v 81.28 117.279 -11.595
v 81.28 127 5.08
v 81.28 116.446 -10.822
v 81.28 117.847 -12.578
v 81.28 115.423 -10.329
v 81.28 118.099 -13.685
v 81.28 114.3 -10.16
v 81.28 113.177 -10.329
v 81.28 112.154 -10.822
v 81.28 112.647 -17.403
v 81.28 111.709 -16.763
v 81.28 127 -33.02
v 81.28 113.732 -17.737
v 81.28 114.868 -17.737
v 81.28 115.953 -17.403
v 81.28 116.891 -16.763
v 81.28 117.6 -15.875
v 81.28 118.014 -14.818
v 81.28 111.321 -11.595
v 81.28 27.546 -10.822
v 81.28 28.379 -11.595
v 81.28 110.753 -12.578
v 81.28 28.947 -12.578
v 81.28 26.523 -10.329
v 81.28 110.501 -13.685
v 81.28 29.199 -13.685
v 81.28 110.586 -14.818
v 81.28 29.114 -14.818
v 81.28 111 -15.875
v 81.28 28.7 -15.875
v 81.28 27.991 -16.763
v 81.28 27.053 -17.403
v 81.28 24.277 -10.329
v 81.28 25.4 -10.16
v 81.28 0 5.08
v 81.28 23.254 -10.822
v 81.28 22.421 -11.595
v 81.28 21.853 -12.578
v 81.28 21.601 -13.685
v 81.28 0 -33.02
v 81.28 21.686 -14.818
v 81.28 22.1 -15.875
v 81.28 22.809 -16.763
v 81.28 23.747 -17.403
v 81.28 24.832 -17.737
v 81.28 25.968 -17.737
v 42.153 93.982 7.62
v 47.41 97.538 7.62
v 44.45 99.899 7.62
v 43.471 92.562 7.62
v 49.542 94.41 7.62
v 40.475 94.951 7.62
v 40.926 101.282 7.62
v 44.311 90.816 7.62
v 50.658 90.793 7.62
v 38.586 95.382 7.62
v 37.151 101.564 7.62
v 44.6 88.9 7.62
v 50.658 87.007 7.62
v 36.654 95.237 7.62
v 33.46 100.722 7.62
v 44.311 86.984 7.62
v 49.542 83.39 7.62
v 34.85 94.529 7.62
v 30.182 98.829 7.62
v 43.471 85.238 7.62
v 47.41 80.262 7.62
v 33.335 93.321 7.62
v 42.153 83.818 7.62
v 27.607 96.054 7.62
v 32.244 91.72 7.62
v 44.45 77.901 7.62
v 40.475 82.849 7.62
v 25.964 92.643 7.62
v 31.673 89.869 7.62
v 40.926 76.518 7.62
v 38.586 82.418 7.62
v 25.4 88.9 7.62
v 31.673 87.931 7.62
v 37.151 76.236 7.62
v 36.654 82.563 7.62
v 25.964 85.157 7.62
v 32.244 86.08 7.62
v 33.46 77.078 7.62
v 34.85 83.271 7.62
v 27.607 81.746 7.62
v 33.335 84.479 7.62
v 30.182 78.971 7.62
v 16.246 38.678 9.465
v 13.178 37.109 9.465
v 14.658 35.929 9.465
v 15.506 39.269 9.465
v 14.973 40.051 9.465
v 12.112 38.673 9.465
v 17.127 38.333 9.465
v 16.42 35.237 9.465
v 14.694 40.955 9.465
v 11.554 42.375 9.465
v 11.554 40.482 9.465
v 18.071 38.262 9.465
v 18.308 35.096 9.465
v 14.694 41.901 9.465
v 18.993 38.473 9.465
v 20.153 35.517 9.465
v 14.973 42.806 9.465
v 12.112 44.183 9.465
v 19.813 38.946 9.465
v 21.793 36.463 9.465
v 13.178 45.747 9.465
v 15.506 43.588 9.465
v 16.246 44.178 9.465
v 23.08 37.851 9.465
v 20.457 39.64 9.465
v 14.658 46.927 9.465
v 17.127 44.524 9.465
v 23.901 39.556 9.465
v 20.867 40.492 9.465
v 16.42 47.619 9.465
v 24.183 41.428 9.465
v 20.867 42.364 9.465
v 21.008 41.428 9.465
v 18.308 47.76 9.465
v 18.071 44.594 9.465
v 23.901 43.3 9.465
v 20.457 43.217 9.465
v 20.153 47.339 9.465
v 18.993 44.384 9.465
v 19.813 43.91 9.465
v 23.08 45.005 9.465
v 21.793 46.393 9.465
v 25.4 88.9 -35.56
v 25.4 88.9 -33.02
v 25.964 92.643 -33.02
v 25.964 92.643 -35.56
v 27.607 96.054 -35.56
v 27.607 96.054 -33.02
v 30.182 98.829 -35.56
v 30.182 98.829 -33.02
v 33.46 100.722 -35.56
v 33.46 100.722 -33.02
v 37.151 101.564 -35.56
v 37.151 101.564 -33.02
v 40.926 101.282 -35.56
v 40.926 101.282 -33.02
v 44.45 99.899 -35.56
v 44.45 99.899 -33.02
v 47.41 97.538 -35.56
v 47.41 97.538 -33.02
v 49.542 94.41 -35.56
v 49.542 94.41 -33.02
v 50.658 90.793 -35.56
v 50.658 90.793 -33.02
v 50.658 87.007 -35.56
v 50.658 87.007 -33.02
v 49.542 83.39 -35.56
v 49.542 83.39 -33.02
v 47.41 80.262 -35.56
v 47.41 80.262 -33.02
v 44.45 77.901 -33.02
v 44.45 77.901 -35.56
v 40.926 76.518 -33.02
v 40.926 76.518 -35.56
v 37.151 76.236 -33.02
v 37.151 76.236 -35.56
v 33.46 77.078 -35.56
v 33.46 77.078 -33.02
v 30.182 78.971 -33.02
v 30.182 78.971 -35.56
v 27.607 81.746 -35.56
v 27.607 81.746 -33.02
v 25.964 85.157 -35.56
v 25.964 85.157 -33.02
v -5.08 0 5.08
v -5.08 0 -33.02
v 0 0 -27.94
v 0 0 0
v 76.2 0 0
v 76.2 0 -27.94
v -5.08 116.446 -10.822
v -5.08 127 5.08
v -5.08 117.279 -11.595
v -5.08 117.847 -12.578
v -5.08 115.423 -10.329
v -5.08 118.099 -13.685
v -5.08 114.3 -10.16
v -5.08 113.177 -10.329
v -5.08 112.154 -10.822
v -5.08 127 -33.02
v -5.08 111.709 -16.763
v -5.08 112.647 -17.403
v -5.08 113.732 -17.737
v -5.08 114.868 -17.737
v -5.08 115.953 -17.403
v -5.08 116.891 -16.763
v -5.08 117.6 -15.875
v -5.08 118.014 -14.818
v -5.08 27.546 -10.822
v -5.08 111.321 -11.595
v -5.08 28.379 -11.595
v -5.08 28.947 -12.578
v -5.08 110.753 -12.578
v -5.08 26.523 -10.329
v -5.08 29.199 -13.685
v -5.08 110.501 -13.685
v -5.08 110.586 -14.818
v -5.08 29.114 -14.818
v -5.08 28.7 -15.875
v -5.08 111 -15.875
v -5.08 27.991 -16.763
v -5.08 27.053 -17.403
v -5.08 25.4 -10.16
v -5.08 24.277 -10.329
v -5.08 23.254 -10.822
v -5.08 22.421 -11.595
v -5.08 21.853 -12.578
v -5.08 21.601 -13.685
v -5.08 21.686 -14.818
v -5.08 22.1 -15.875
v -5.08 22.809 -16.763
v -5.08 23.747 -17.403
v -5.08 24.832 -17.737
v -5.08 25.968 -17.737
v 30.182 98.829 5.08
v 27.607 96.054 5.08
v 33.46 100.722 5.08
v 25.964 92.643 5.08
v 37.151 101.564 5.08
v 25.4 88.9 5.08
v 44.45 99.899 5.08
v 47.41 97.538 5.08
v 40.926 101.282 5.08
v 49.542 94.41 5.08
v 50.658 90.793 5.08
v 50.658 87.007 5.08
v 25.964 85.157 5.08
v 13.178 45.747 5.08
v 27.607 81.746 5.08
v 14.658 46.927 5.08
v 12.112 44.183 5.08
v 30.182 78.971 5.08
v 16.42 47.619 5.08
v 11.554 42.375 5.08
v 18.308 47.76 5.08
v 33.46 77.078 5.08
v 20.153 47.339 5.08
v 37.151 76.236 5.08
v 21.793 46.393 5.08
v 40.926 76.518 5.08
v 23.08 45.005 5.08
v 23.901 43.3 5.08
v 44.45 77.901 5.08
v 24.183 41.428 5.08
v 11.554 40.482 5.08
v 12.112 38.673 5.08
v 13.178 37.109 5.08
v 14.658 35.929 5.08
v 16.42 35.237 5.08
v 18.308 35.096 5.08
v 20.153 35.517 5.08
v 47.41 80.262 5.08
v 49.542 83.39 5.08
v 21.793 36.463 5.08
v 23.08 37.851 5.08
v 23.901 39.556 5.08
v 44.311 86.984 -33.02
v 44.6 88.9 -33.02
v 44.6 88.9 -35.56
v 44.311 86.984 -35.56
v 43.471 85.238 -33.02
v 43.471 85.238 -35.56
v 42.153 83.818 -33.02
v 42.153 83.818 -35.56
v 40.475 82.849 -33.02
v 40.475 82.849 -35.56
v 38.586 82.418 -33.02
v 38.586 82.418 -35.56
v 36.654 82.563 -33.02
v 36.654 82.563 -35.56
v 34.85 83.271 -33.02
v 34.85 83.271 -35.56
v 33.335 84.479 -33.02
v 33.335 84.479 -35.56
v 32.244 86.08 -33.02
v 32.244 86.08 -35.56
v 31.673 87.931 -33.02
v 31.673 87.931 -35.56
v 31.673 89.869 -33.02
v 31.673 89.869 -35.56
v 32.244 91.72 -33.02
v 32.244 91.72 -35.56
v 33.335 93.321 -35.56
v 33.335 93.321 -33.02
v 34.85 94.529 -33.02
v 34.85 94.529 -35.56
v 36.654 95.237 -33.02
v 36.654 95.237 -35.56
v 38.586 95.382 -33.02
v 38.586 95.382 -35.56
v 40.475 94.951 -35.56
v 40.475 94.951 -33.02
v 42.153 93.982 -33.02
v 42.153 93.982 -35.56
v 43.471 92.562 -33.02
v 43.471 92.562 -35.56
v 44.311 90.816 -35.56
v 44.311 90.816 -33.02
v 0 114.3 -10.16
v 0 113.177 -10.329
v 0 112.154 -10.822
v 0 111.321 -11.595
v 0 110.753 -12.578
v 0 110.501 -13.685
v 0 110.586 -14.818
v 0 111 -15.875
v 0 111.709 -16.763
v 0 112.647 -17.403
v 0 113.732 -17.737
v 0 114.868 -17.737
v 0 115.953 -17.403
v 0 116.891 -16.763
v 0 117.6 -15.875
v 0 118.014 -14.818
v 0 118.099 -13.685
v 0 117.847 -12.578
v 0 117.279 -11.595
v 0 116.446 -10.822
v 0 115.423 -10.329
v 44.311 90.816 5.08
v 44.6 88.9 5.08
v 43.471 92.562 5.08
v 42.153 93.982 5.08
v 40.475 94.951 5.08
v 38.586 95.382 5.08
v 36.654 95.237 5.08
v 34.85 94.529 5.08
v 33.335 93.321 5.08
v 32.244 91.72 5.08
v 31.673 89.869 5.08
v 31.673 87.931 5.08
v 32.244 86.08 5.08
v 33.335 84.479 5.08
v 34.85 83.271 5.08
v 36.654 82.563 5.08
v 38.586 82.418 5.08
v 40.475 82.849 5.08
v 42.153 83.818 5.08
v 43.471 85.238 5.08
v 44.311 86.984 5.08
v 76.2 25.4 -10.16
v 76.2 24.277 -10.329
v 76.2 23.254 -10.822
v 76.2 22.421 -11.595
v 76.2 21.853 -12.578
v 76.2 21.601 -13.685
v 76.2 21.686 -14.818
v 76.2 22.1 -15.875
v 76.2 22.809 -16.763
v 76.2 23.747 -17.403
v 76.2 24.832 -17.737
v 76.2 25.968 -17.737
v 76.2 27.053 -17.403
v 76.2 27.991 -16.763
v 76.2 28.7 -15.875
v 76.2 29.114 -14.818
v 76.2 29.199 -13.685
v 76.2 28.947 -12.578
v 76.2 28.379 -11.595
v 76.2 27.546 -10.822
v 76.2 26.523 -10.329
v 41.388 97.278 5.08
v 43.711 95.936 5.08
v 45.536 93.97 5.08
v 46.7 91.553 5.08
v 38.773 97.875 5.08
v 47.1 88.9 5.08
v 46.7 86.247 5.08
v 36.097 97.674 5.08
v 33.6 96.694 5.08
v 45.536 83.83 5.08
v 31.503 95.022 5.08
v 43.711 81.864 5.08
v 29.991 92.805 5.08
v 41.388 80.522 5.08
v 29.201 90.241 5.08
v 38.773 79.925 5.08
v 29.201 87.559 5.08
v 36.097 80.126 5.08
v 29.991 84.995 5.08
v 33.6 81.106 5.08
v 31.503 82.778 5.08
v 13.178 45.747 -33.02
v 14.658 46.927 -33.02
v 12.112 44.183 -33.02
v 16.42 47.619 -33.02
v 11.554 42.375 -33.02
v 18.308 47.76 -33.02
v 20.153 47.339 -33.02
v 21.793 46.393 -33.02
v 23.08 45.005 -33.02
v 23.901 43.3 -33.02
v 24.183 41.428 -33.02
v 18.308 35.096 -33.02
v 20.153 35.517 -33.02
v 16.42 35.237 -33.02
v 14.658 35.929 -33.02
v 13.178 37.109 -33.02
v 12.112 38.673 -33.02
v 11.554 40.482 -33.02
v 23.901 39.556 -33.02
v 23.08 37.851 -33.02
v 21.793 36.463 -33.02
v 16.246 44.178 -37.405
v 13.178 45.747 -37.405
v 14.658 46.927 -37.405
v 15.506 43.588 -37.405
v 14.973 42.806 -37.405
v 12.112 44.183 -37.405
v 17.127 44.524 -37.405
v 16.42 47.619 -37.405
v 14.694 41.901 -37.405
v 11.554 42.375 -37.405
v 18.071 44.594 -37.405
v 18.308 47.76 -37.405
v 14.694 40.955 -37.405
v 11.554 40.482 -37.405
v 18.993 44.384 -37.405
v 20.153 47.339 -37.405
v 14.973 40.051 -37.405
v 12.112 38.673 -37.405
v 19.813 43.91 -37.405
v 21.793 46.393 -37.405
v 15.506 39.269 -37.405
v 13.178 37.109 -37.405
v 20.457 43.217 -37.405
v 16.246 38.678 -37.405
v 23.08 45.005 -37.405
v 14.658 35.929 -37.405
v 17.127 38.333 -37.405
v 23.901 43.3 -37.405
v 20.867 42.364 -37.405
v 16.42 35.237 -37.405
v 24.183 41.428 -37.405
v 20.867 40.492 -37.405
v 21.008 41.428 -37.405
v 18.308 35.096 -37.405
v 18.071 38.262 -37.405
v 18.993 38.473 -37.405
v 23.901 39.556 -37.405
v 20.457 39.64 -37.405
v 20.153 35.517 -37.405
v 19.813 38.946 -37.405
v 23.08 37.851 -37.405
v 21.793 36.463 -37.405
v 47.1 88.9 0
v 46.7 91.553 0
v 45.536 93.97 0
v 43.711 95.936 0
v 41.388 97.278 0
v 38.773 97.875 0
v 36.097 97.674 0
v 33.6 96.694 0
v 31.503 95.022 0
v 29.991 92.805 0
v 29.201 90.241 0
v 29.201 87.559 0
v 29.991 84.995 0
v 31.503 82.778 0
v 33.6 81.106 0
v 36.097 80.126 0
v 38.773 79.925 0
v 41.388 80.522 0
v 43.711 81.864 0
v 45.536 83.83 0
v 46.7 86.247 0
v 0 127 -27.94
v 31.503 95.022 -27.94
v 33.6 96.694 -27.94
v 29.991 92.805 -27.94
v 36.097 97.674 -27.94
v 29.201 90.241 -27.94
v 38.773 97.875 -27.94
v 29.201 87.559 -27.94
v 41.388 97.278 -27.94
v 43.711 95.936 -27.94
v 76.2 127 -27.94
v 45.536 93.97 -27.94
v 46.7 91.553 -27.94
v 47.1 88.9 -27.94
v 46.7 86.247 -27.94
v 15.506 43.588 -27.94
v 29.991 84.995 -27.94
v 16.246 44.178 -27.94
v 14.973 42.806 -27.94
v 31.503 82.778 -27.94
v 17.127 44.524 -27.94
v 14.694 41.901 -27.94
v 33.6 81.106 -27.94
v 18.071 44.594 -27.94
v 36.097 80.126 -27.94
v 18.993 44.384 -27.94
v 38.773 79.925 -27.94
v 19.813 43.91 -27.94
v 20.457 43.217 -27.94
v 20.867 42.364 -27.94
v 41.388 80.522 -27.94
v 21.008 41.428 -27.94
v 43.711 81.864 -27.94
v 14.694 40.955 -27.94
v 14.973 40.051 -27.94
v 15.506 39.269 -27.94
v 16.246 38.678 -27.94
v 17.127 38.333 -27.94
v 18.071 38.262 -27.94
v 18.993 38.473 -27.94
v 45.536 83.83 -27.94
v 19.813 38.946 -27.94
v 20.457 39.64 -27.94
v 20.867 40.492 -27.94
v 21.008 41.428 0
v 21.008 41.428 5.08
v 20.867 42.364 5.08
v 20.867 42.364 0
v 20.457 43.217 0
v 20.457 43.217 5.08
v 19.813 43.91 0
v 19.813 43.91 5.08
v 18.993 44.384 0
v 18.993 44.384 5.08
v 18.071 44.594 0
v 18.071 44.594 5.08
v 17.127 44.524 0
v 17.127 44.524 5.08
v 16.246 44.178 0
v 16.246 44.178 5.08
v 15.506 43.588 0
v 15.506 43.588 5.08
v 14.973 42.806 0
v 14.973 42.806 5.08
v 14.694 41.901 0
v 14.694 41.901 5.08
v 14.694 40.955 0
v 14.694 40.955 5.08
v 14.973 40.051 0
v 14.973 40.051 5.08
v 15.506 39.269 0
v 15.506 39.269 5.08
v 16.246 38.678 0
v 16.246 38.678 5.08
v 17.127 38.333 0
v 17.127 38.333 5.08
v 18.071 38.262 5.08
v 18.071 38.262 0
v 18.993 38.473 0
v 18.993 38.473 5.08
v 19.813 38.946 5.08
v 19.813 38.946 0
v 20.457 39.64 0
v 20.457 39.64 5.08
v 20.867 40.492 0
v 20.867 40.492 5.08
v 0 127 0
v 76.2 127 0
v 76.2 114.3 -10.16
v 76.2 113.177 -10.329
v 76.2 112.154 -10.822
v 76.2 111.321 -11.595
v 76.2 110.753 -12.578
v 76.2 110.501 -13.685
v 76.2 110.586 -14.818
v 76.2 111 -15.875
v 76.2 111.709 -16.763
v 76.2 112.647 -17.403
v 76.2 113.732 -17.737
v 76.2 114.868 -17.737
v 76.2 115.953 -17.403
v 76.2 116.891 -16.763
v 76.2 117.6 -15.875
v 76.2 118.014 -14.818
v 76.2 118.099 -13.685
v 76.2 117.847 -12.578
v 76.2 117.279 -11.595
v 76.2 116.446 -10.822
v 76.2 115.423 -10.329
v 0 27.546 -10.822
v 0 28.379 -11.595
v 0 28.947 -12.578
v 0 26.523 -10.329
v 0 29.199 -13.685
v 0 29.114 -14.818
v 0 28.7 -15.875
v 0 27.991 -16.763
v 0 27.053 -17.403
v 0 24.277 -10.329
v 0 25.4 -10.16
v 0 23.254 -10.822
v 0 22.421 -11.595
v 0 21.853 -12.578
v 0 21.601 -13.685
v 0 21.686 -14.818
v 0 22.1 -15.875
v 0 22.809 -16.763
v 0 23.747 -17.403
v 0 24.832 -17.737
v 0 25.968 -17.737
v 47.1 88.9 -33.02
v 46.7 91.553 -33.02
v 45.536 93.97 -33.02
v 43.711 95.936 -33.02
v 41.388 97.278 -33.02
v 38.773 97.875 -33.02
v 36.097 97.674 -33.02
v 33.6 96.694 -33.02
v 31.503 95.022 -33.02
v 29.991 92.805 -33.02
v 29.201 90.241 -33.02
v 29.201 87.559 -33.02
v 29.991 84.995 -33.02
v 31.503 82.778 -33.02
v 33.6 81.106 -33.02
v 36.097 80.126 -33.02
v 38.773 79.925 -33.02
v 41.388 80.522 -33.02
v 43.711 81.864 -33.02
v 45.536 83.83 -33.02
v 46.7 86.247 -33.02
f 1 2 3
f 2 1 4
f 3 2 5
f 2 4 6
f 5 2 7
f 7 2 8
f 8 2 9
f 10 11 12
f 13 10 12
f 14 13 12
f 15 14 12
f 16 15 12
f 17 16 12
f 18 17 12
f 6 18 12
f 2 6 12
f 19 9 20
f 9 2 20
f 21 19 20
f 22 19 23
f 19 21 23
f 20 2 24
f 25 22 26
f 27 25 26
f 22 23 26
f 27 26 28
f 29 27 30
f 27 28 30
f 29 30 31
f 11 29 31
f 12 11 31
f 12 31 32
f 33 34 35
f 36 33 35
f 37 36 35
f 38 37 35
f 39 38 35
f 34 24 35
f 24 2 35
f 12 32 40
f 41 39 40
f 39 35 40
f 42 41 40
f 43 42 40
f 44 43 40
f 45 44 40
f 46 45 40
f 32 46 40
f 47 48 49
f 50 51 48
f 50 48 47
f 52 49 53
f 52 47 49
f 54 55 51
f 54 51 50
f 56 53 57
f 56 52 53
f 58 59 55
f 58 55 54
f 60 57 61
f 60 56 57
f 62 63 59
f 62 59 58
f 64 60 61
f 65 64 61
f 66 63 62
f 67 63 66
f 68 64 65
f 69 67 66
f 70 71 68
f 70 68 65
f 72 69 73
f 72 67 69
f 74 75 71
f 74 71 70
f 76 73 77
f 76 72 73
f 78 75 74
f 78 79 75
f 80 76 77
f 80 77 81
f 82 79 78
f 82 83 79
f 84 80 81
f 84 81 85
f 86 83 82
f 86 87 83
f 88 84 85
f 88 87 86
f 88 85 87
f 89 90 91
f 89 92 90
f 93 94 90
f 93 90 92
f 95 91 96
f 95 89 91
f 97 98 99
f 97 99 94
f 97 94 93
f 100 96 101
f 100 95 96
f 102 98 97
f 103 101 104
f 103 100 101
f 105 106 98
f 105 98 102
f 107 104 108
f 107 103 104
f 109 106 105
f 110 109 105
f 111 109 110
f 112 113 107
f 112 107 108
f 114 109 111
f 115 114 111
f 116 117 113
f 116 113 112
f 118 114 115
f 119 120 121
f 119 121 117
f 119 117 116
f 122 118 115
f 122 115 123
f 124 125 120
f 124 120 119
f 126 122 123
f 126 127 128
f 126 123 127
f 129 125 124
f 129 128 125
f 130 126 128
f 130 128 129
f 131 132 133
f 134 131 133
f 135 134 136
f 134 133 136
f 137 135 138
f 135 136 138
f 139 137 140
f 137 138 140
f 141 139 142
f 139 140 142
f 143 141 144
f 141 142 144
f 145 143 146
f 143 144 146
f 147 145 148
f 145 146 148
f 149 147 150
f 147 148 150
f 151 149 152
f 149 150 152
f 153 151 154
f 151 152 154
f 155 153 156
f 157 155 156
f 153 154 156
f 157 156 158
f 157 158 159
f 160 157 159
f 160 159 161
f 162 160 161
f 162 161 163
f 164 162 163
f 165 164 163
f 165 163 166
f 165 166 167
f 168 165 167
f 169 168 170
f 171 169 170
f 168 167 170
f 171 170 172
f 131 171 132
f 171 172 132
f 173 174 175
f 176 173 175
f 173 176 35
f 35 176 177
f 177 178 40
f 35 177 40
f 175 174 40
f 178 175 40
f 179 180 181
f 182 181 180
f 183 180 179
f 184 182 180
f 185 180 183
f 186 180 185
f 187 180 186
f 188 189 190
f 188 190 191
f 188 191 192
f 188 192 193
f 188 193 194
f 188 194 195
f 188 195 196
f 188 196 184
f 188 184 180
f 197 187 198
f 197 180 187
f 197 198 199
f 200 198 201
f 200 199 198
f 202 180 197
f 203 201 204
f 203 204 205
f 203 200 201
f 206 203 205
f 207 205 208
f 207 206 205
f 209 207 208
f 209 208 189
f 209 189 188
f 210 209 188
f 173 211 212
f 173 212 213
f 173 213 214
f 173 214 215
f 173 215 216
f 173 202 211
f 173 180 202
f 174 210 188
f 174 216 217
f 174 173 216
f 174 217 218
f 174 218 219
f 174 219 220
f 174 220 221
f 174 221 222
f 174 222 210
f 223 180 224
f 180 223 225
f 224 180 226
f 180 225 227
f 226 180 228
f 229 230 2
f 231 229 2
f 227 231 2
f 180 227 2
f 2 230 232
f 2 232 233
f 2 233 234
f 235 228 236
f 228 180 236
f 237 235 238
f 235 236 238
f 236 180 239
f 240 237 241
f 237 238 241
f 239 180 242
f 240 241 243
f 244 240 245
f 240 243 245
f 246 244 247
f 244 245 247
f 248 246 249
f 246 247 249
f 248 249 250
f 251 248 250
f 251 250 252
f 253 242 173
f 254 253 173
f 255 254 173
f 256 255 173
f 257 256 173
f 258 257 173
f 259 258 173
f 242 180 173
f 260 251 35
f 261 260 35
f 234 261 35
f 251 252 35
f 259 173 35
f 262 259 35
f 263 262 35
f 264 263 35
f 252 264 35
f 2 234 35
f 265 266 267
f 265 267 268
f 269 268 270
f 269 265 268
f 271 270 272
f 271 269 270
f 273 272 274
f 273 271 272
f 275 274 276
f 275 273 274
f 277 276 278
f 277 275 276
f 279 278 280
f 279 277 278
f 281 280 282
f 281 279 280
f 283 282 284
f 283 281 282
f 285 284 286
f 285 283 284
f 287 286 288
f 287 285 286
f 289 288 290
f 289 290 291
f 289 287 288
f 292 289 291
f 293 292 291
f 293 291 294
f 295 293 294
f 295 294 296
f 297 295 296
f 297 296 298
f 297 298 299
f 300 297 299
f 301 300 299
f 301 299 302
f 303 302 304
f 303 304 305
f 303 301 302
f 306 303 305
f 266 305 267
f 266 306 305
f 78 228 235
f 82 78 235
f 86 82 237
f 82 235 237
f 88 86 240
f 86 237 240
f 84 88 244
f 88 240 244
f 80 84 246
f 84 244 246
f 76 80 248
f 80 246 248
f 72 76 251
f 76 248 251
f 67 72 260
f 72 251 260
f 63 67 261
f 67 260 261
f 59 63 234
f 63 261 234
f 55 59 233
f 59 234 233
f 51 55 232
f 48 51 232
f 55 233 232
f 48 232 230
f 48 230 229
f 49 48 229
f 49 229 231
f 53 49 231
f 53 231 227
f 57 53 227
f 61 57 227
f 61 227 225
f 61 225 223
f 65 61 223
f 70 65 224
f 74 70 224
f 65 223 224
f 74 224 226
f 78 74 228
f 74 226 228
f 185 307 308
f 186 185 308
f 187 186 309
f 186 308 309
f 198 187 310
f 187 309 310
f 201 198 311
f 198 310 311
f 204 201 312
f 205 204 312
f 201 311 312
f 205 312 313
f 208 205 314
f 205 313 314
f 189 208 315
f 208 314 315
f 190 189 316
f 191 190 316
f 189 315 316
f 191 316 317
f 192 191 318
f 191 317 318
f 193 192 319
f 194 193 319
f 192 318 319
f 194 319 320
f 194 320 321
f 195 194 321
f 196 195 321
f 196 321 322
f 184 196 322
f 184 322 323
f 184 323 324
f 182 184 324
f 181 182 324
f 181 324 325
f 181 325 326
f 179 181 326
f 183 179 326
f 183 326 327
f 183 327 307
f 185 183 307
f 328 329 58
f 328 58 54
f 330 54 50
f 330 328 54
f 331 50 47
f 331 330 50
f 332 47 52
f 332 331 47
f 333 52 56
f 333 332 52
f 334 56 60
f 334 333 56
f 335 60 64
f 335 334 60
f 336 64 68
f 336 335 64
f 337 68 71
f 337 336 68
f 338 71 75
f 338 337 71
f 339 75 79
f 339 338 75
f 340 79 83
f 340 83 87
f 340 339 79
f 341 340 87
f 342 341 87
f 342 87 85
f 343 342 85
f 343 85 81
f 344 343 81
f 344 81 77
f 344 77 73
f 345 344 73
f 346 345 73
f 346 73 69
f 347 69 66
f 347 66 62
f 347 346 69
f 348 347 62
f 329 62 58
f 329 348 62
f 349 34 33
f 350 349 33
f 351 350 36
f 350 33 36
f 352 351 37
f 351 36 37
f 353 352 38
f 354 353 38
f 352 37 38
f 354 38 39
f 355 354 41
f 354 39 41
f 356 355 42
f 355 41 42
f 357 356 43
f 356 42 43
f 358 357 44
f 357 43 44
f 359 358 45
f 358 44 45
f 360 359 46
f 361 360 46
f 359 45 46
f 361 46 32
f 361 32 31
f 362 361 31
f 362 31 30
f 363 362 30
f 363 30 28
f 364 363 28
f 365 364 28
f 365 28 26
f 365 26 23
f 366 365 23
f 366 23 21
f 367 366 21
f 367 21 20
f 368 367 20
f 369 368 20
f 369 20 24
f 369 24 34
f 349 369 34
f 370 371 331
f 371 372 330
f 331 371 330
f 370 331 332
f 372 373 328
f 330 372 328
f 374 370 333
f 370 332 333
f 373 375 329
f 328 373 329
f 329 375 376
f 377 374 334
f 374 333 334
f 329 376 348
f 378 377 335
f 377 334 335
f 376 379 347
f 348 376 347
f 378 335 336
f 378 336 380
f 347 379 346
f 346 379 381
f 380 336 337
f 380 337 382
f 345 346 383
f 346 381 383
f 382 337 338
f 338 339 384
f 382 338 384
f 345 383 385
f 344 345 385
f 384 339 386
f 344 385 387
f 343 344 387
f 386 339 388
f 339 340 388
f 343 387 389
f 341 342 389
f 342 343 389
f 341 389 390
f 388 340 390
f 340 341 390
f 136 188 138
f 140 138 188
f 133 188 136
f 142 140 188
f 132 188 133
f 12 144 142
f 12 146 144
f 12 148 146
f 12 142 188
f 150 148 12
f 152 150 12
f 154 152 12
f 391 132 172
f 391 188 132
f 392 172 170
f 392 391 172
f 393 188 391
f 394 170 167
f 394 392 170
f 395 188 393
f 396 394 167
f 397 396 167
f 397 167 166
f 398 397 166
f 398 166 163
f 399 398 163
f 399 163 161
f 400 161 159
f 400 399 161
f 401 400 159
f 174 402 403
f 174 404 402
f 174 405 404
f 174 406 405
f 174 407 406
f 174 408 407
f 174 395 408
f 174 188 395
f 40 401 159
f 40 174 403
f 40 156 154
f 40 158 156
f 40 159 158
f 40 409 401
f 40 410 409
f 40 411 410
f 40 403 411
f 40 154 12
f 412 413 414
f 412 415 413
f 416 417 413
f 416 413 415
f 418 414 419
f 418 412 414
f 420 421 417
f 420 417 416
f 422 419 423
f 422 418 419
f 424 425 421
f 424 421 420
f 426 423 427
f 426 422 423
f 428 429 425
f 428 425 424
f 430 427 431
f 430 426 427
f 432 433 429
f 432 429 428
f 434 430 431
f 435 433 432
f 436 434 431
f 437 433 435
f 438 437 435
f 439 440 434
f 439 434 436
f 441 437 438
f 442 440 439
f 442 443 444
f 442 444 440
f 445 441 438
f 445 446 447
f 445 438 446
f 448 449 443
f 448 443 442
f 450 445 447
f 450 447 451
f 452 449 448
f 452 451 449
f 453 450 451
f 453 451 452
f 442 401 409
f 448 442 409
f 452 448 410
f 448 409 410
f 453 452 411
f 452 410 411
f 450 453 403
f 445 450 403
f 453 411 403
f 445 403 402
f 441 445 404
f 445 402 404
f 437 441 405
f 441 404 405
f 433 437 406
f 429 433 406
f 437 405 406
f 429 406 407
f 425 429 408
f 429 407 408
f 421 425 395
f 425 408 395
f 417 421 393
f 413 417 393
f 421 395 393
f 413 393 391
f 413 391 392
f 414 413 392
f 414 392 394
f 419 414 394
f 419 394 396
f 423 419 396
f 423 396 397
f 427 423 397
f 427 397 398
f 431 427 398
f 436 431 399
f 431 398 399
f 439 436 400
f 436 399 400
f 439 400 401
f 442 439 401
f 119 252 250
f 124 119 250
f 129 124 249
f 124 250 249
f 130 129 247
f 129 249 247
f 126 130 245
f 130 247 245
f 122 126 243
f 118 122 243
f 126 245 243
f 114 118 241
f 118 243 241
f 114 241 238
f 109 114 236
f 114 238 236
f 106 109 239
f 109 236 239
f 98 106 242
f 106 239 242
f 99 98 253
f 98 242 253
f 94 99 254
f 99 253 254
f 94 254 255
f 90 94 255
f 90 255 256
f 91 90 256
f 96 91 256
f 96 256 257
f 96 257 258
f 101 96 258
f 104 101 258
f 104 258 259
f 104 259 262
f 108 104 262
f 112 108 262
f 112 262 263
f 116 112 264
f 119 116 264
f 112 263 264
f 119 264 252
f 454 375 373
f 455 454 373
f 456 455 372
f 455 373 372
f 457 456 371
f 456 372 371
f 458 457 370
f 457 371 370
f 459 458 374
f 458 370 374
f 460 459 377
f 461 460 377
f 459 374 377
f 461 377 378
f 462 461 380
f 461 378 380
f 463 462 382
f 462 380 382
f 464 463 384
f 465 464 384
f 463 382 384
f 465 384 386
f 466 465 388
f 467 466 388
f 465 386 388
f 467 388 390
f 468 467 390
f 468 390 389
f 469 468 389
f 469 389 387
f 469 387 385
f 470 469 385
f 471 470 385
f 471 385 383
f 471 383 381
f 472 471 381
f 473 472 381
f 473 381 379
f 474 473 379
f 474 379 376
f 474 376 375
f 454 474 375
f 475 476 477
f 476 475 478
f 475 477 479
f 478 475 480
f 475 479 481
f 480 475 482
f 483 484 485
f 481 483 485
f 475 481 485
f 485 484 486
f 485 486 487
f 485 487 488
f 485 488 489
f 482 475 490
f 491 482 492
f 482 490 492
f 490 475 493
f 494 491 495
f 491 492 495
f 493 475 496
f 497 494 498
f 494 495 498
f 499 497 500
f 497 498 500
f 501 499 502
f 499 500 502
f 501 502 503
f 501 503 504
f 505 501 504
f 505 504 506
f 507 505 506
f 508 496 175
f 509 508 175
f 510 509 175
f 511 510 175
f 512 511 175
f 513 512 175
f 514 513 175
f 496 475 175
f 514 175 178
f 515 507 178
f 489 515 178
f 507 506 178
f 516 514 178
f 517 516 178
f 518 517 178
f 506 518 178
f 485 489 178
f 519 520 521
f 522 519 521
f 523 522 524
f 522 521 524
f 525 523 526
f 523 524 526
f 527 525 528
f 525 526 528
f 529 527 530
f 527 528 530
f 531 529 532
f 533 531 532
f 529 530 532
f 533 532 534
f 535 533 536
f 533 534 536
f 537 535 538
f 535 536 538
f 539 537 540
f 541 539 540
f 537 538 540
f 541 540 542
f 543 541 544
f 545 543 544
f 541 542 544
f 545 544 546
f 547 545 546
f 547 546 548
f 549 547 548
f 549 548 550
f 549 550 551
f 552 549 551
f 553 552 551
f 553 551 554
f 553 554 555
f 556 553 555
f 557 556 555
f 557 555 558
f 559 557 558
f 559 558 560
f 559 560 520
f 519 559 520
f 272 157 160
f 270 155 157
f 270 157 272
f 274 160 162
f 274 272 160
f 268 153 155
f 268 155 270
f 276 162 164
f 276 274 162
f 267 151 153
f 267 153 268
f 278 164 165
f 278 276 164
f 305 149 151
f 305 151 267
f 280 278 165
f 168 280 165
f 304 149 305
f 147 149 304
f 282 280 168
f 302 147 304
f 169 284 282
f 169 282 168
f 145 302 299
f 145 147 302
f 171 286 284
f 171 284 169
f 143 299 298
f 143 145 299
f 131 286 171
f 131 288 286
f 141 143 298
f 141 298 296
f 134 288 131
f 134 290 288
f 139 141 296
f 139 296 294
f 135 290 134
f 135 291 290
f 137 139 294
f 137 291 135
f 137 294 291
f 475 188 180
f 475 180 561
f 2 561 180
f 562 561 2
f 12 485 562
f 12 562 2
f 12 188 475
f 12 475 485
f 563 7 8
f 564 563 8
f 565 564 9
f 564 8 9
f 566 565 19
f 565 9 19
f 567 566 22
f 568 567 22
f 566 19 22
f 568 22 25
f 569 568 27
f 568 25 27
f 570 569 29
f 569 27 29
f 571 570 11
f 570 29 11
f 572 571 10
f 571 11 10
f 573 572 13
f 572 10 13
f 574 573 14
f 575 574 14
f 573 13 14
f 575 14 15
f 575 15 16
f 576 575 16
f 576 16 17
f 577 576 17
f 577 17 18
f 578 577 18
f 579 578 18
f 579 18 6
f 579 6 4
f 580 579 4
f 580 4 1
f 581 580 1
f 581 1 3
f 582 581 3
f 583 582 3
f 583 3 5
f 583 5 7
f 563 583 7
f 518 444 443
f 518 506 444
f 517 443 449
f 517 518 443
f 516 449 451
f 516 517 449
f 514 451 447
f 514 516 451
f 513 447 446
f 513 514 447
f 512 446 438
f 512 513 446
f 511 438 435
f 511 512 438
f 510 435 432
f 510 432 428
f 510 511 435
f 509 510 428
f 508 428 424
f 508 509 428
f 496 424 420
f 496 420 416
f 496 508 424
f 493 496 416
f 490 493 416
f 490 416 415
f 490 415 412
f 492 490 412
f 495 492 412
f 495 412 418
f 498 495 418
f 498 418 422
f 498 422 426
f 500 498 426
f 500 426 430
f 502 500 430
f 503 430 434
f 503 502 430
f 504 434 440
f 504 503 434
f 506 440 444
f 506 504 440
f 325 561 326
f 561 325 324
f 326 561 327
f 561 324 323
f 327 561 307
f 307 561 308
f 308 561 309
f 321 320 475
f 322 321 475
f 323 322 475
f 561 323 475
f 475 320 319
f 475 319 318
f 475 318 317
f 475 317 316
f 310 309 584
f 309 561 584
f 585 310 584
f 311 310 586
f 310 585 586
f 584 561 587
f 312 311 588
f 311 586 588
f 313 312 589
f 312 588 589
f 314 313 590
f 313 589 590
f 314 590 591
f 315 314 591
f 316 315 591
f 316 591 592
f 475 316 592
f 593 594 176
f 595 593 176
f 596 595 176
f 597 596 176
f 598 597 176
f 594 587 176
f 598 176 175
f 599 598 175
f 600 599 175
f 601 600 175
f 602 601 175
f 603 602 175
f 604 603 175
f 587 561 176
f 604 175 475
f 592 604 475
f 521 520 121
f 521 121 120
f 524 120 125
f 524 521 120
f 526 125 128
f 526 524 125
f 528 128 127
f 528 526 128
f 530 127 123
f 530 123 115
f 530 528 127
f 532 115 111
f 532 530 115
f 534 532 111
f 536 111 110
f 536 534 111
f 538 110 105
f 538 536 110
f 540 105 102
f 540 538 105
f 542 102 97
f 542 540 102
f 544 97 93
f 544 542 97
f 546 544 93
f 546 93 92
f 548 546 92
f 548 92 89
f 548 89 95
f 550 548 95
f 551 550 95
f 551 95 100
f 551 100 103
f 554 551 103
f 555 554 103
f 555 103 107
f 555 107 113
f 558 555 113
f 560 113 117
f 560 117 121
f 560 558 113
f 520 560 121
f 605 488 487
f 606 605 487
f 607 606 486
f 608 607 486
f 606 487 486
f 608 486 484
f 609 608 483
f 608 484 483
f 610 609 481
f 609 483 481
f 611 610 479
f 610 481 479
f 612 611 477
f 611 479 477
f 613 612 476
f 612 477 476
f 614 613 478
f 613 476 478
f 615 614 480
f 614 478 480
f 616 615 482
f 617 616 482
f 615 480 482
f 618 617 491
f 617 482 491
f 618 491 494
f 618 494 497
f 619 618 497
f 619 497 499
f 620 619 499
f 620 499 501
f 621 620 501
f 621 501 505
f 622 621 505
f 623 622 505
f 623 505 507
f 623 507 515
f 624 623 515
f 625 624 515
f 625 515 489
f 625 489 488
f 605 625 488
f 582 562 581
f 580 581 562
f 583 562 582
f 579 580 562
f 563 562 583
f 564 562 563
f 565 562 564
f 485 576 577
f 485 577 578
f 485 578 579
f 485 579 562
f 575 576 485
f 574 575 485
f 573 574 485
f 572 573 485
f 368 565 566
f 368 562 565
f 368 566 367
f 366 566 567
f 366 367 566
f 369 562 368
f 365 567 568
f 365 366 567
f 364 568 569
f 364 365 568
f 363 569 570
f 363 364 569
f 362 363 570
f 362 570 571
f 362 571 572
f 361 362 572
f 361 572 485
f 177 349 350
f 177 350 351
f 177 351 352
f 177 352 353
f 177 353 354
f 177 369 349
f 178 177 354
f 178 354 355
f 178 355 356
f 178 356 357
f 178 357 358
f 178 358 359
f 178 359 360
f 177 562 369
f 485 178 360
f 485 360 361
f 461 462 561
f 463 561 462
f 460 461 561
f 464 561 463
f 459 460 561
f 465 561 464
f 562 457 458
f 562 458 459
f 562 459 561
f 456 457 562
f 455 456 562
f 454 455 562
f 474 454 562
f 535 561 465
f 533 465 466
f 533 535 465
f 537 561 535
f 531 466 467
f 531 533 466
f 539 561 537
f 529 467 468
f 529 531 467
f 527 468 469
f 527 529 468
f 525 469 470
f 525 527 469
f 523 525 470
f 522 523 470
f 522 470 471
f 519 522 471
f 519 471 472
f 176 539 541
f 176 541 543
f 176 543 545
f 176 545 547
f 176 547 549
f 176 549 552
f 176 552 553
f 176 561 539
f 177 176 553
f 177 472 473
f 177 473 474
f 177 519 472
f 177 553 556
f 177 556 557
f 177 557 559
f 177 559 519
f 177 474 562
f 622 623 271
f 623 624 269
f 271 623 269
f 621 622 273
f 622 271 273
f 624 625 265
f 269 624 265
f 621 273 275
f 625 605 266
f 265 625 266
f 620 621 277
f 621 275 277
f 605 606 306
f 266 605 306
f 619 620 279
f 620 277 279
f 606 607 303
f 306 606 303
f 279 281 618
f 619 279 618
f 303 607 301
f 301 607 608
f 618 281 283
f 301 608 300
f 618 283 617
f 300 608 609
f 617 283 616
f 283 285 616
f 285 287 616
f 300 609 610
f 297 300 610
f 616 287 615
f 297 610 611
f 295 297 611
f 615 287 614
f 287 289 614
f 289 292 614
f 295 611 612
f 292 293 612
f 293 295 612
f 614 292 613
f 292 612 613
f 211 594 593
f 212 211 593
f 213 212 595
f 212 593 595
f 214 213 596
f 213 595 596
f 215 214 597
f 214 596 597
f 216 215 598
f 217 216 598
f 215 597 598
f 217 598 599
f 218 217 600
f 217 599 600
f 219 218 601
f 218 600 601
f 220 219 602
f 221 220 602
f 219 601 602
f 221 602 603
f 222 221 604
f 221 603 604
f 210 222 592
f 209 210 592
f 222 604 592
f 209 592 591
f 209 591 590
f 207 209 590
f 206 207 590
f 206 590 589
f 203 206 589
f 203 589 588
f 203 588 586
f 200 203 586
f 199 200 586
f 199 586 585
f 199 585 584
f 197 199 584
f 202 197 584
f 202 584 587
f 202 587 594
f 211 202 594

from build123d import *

# Parameters (mm, degrees)
SKETCH1_W               = 86.36
SKETCH1_H               = 38.1
SKETCH1_W_2             = 76.2
SKETCH1_H_2             = 27.94
BOSS_EXTRUDE1_DEPTH     = 127
SKETCH2_R               = 9.000000018
SKETCH2_R_2             = 3.175
CUT_EXTRUDE1_DEPTH      = 156.521858271
SKETCH3_R               = 3.81
CUT_EXTRUDE2_DEPTH      = 158.090324336
CUT_EXTRUDE2_DEPTH_BACK = 158.090324336
SKETCH4_R               = 6.35
SKETCH4_R_2             = 3.175
BOSS_EXTRUDE2_DEPTH     = 4.385
SKETCH5_R               = 6.35
SKETCH5_R_2             = 3.175
BOSS_EXTRUDE3_DEPTH     = 4.38500012
SKETCH6_R               = 12.7
SKETCH6_R_2             = 6.5
BOSS_EXTRUDE4_DEPTH     = 2.54
SKETCH7_R               = 12.7
SKETCH7_R_2             = 6.5
BOSS_EXTRUDE5_DEPTH     = 2.54


with BuildPart() as part:
    # Sketch1 → Boss-Extrude1 (new body)
    with BuildSketch(Plane(origin=(0, 0, 0), x_dir=(1, 0, 0), z_dir=(0, 1, 0))):
        with Locations((38.1, 13.97)):
            Rectangle(SKETCH1_W, SKETCH1_H)
        with Locations((38.1, 13.97)):
            Rectangle(SKETCH1_W_2, SKETCH1_H_2, mode=Mode.SUBTRACT)
    extrude(amount=BOSS_EXTRUDE1_DEPTH)

    # Sketch2 → Cut-Extrude1 (cut, through all)
    with BuildSketch(Plane.XY.offset(5.08)):
        with Locations((38.1, 88.9)):
            Circle(SKETCH2_R)
        with Locations((17.833355107, 41.428109825)):
            Circle(SKETCH2_R_2)
    extrude(amount=-CUT_EXTRUDE1_DEPTH, mode=Mode.SUBTRACT)

    # Sketch3 → Cut-Extrude2 (cut, two sides)
    with BuildSketch(Plane(origin=(81.28, 0, 0), x_dir=(0, 0, -1), z_dir=(1, 0, 0))) as cut_extrude2_sk:
        with Locations(Location((13.97, 114.3, 0), (0, 0, 180))):
            Circle(SKETCH3_R)
        with Locations(Location((13.97, 25.4, 0), (0, 0, 180))):
            Circle(SKETCH3_R)
    extrude(amount=CUT_EXTRUDE2_DEPTH, mode=Mode.SUBTRACT)
    extrude(cut_extrude2_sk.sketch, amount=-CUT_EXTRUDE2_DEPTH_BACK, mode=Mode.SUBTRACT)

    # Sketch4 → Boss-Extrude2 (add)
    with BuildSketch(Plane(origin=(0, 0, -33.02), x_dir=(-1, 0, 0), z_dir=(0, 0, -1))):
        with Locations(Location((-17.833355107, 41.428109825, 0), (0, 0, 180))):
            Circle(SKETCH4_R)
        with Locations(Location((-17.833355107, 41.428109825, 0), (0, 0, 180))):
            Circle(SKETCH4_R_2, mode=Mode.SUBTRACT)
    extrude(amount=BOSS_EXTRUDE2_DEPTH)

    # Sketch5 → Boss-Extrude3 (add)
    with BuildSketch(Plane.XY.offset(5.08)):
        with Locations((17.833355107, 41.428109825)):
            Circle(SKETCH5_R)
        with Locations((17.833355107, 41.428109825)):
            Circle(SKETCH5_R_2, mode=Mode.SUBTRACT)
    extrude(amount=BOSS_EXTRUDE3_DEPTH)

    # Sketch6 → Boss-Extrude4 (add)
    with BuildSketch(Plane.XY.offset(5.08)):
        with Locations(Location((38.1, 88.9, 0), (0, 0, 180))):
            Circle(SKETCH6_R)
        with Locations((38.1, 88.9)):
            Circle(SKETCH6_R_2, mode=Mode.SUBTRACT)
    extrude(amount=BOSS_EXTRUDE4_DEPTH)

    # Sketch7 → Boss-Extrude5 (add)
    with BuildSketch(Plane(origin=(0, 0, -33.02), x_dir=(-1, 0, 0), z_dir=(0, 0, -1))):
        with Locations((-38.1, 88.9)):
            Circle(SKETCH7_R)
        with Locations(Location((-38.1, 88.9, 0), (0, 0, 180))):
            Circle(SKETCH7_R_2, mode=Mode.SUBTRACT)
    extrude(amount=BOSS_EXTRUDE5_DEPTH)


solid = part.part
